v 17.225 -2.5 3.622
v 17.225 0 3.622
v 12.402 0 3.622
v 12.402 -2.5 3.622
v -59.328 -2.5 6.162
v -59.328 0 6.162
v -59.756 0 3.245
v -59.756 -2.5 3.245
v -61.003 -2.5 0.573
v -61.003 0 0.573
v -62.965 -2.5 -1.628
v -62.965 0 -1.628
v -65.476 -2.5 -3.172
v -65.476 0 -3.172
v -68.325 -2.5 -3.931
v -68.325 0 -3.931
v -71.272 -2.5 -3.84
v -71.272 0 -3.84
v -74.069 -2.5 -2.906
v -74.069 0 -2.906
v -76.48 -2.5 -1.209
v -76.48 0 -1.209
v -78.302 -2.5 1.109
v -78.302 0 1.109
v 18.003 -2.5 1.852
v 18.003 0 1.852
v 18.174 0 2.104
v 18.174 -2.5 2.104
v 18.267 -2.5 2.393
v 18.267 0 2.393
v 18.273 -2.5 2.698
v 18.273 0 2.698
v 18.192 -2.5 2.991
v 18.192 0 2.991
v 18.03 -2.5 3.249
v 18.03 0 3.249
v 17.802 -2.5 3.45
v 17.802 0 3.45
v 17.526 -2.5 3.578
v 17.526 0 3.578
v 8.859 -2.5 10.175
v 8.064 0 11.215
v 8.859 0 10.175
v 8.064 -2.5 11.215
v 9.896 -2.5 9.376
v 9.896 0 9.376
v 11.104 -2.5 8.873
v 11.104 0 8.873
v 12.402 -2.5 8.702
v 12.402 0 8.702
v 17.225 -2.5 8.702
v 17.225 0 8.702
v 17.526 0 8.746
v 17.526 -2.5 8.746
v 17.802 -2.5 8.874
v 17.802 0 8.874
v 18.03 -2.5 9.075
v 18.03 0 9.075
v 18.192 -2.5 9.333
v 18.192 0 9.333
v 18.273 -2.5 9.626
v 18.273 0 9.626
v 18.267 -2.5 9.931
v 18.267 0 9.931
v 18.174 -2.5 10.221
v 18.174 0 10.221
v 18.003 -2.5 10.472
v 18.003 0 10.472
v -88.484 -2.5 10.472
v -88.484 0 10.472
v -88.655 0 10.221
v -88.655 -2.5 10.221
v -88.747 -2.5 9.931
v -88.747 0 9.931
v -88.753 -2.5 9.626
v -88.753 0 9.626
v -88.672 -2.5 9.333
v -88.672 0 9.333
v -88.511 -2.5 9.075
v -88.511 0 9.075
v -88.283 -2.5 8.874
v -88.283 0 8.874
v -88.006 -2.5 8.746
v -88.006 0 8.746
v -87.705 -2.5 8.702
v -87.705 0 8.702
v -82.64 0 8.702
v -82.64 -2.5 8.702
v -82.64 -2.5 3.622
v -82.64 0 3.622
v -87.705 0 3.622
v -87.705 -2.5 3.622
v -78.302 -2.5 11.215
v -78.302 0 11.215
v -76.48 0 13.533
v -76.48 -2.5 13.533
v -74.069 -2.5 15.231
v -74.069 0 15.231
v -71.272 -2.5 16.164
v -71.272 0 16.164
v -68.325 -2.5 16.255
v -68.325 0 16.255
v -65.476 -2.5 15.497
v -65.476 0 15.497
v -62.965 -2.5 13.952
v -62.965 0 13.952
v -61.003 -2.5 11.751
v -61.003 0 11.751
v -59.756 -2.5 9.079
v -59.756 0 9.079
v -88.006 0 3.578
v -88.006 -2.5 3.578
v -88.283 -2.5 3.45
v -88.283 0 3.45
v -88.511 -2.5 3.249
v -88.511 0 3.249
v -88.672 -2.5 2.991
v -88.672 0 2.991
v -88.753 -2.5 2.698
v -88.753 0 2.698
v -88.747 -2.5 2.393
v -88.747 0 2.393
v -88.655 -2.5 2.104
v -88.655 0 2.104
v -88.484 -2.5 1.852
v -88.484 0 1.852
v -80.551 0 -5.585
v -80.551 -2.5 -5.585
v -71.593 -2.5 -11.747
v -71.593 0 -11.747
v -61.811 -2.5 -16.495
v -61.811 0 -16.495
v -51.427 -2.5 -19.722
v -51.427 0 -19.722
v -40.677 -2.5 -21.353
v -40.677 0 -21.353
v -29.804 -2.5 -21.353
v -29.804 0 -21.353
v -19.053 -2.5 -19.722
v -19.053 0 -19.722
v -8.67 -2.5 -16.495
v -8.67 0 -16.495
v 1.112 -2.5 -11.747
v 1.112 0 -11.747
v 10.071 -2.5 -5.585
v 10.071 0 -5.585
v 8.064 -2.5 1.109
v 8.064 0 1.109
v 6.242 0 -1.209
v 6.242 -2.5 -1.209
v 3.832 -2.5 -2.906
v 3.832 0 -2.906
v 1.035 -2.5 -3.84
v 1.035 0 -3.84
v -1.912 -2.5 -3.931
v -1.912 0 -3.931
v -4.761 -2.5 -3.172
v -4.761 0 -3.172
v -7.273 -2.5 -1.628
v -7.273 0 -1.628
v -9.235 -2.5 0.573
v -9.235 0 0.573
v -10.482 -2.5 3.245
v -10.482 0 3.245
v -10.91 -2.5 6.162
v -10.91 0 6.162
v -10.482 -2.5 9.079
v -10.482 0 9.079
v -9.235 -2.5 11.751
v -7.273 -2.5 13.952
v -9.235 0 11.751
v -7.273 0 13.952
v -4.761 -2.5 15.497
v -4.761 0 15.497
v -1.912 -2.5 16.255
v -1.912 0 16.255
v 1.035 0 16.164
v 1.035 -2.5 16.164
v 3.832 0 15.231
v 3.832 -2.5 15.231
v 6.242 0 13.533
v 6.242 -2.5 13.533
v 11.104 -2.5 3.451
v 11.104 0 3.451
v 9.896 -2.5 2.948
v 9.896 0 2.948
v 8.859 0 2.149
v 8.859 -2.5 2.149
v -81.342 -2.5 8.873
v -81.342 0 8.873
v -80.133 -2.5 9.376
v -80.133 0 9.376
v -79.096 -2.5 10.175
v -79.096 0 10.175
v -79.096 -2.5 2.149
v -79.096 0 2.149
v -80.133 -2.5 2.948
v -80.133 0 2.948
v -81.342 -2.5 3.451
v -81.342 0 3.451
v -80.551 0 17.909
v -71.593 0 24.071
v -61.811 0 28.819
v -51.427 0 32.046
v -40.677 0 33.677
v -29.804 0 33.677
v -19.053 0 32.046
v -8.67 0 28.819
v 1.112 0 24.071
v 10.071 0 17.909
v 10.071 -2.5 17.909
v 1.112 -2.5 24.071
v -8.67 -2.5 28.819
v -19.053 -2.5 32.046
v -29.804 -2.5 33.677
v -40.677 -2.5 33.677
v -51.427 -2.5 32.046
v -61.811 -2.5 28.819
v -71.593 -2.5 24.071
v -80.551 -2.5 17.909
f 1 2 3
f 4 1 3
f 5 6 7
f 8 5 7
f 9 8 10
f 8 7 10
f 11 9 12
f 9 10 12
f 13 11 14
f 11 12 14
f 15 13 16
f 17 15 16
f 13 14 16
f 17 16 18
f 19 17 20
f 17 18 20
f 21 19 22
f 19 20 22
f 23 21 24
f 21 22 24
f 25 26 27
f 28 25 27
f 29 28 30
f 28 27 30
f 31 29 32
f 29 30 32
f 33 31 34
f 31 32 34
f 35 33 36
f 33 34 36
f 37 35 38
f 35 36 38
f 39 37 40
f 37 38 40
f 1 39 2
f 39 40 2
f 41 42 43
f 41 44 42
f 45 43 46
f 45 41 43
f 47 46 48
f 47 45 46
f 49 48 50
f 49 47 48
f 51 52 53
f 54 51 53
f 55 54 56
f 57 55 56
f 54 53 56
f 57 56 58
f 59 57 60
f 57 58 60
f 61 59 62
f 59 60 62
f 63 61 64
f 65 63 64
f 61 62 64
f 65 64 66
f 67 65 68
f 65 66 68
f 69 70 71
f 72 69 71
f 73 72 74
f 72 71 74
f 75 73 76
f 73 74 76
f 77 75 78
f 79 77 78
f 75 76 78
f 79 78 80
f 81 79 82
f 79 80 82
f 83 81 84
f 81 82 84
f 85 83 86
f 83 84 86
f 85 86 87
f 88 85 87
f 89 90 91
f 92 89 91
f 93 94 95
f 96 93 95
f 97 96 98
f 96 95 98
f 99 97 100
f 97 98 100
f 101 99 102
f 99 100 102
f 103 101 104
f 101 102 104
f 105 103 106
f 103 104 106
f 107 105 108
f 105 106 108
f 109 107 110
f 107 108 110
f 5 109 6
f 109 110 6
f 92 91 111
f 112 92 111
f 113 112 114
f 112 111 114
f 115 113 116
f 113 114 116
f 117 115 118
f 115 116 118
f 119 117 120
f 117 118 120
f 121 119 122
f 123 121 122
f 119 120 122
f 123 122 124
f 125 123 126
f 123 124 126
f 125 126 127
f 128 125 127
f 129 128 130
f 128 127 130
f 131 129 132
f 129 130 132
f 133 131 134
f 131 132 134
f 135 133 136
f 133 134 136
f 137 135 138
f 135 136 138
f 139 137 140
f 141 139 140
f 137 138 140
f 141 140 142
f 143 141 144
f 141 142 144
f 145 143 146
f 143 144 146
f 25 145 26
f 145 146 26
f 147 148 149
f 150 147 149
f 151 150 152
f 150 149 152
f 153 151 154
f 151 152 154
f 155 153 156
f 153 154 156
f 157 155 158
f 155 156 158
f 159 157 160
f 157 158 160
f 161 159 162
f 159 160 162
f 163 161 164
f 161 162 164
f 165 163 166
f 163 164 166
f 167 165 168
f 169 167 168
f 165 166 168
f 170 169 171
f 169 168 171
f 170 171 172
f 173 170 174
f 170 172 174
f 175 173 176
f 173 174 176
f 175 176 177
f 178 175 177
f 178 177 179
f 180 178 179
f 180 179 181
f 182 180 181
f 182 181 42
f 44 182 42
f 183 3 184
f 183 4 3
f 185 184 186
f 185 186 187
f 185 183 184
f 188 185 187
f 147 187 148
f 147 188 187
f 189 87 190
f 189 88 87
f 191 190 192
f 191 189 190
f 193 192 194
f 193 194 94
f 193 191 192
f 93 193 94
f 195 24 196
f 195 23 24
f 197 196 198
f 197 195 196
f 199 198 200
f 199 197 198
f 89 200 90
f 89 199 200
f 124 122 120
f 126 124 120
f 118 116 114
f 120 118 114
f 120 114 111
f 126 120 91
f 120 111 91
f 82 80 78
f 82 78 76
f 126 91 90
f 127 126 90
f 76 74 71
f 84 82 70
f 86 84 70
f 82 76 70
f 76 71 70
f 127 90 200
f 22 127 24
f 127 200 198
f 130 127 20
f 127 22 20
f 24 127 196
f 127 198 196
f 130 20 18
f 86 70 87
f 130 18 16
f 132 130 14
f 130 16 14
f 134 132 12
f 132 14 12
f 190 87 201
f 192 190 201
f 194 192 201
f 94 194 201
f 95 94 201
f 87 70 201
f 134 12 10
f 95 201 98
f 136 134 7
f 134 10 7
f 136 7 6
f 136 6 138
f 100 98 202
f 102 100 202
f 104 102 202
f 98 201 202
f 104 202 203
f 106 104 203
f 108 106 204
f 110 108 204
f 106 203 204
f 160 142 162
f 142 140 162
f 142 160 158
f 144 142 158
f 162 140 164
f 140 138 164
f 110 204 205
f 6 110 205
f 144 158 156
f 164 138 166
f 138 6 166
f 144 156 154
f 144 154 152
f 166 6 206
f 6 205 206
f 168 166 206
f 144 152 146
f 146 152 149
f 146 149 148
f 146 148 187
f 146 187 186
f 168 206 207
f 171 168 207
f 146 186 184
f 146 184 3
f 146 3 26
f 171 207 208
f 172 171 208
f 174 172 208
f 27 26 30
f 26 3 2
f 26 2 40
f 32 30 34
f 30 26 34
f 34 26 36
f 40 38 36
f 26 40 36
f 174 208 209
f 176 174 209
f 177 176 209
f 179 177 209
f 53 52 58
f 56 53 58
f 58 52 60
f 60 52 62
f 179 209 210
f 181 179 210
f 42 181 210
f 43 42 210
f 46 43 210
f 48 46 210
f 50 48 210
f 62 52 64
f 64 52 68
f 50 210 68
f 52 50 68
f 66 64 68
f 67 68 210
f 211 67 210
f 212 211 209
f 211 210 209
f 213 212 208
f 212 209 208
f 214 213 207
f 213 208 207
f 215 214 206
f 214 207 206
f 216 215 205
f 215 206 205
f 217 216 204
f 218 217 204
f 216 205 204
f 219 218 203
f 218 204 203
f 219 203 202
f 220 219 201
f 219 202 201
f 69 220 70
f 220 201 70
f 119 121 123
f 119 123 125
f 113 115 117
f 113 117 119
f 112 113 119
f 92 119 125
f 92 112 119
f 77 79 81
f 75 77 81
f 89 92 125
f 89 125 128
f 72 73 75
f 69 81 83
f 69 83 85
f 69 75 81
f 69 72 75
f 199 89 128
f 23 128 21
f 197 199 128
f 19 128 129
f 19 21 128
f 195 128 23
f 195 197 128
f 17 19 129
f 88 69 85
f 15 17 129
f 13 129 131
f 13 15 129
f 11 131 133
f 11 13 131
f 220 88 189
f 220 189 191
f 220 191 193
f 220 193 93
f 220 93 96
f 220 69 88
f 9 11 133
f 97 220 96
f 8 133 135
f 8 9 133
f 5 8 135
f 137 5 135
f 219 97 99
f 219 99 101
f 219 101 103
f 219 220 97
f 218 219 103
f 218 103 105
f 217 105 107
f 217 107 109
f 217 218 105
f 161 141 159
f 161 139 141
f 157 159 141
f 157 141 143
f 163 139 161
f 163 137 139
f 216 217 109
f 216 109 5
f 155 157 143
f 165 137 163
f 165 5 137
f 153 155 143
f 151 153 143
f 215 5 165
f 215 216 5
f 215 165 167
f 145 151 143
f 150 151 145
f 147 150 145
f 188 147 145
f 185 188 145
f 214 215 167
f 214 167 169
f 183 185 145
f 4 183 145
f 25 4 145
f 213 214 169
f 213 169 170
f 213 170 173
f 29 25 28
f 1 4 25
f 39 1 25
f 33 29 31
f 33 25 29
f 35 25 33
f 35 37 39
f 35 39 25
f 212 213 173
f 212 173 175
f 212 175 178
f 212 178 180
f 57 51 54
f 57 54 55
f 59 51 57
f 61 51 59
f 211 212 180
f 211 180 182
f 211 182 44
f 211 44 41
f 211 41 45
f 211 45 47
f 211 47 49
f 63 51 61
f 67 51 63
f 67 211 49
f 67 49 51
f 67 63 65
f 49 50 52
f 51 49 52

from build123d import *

# Parameters (mm, degrees)
F1_DEPTH = 2.5
F2_R     = 5


with BuildPart() as f1:
    # F0 (on Front) → F1 (new body)
    with BuildSketch(Plane.XZ):
        with BuildLine():
            ThreePointArc((17.224815, 8.702017), (18.191599, 9.333046), (18.003069, 10.472047))
            ThreePointArc((18.003069, 10.472047), (-35.240268, 33.882295), (-88.483606, 10.472047))
            ThreePointArc((-88.483606, 10.472047), (-88.672136, 9.333046), (-87.705352, 8.702017))
            Line((-87.705352, 8.702017), (-79.325233, 8.702017))
            ThreePointArc((-79.325233, 8.702017), (-68.207651, 16.241039), (-59.327855, 6.162017))
            ThreePointArc((-59.327855, 6.162017), (-68.207651, -3.917004), (-79.325233, 3.622017))
            Line((-79.325233, 3.622017), (-87.705352, 3.622017))
            ThreePointArc((-87.705352, 3.622017), (-88.672136, 2.990989), (-88.483606, 1.851987))
            ThreePointArc((-88.483606, 1.851987), (-35.240268, -21.558261), (18.003069, 1.851987))
            ThreePointArc((18.003069, 1.851987), (18.191599, 2.990989), (17.224815, 3.622017))
            Line((17.224815, 3.622017), (9.087631, 3.622017))
            ThreePointArc((9.087631, 3.622017), (-10.909747, 6.162017), (9.087631, 8.702017))
            Line((9.087631, 8.702017), (17.224815, 8.702017))
        make_face()
    extrude(amount=F1_DEPTH)

    # F2
    f2_edges = [f1.edges().sort_by_distance(p)[0] for p in [
        (-79.325233, -1.25, 3.622017),
        (-79.325233, -1.25, 8.702017),
        (9.087631, -1.25, 8.702017),
        (9.087631, -1.25, 3.622017),
    ]]
    fillet(f2_edges, radius=F2_R)


solid = f1.part
